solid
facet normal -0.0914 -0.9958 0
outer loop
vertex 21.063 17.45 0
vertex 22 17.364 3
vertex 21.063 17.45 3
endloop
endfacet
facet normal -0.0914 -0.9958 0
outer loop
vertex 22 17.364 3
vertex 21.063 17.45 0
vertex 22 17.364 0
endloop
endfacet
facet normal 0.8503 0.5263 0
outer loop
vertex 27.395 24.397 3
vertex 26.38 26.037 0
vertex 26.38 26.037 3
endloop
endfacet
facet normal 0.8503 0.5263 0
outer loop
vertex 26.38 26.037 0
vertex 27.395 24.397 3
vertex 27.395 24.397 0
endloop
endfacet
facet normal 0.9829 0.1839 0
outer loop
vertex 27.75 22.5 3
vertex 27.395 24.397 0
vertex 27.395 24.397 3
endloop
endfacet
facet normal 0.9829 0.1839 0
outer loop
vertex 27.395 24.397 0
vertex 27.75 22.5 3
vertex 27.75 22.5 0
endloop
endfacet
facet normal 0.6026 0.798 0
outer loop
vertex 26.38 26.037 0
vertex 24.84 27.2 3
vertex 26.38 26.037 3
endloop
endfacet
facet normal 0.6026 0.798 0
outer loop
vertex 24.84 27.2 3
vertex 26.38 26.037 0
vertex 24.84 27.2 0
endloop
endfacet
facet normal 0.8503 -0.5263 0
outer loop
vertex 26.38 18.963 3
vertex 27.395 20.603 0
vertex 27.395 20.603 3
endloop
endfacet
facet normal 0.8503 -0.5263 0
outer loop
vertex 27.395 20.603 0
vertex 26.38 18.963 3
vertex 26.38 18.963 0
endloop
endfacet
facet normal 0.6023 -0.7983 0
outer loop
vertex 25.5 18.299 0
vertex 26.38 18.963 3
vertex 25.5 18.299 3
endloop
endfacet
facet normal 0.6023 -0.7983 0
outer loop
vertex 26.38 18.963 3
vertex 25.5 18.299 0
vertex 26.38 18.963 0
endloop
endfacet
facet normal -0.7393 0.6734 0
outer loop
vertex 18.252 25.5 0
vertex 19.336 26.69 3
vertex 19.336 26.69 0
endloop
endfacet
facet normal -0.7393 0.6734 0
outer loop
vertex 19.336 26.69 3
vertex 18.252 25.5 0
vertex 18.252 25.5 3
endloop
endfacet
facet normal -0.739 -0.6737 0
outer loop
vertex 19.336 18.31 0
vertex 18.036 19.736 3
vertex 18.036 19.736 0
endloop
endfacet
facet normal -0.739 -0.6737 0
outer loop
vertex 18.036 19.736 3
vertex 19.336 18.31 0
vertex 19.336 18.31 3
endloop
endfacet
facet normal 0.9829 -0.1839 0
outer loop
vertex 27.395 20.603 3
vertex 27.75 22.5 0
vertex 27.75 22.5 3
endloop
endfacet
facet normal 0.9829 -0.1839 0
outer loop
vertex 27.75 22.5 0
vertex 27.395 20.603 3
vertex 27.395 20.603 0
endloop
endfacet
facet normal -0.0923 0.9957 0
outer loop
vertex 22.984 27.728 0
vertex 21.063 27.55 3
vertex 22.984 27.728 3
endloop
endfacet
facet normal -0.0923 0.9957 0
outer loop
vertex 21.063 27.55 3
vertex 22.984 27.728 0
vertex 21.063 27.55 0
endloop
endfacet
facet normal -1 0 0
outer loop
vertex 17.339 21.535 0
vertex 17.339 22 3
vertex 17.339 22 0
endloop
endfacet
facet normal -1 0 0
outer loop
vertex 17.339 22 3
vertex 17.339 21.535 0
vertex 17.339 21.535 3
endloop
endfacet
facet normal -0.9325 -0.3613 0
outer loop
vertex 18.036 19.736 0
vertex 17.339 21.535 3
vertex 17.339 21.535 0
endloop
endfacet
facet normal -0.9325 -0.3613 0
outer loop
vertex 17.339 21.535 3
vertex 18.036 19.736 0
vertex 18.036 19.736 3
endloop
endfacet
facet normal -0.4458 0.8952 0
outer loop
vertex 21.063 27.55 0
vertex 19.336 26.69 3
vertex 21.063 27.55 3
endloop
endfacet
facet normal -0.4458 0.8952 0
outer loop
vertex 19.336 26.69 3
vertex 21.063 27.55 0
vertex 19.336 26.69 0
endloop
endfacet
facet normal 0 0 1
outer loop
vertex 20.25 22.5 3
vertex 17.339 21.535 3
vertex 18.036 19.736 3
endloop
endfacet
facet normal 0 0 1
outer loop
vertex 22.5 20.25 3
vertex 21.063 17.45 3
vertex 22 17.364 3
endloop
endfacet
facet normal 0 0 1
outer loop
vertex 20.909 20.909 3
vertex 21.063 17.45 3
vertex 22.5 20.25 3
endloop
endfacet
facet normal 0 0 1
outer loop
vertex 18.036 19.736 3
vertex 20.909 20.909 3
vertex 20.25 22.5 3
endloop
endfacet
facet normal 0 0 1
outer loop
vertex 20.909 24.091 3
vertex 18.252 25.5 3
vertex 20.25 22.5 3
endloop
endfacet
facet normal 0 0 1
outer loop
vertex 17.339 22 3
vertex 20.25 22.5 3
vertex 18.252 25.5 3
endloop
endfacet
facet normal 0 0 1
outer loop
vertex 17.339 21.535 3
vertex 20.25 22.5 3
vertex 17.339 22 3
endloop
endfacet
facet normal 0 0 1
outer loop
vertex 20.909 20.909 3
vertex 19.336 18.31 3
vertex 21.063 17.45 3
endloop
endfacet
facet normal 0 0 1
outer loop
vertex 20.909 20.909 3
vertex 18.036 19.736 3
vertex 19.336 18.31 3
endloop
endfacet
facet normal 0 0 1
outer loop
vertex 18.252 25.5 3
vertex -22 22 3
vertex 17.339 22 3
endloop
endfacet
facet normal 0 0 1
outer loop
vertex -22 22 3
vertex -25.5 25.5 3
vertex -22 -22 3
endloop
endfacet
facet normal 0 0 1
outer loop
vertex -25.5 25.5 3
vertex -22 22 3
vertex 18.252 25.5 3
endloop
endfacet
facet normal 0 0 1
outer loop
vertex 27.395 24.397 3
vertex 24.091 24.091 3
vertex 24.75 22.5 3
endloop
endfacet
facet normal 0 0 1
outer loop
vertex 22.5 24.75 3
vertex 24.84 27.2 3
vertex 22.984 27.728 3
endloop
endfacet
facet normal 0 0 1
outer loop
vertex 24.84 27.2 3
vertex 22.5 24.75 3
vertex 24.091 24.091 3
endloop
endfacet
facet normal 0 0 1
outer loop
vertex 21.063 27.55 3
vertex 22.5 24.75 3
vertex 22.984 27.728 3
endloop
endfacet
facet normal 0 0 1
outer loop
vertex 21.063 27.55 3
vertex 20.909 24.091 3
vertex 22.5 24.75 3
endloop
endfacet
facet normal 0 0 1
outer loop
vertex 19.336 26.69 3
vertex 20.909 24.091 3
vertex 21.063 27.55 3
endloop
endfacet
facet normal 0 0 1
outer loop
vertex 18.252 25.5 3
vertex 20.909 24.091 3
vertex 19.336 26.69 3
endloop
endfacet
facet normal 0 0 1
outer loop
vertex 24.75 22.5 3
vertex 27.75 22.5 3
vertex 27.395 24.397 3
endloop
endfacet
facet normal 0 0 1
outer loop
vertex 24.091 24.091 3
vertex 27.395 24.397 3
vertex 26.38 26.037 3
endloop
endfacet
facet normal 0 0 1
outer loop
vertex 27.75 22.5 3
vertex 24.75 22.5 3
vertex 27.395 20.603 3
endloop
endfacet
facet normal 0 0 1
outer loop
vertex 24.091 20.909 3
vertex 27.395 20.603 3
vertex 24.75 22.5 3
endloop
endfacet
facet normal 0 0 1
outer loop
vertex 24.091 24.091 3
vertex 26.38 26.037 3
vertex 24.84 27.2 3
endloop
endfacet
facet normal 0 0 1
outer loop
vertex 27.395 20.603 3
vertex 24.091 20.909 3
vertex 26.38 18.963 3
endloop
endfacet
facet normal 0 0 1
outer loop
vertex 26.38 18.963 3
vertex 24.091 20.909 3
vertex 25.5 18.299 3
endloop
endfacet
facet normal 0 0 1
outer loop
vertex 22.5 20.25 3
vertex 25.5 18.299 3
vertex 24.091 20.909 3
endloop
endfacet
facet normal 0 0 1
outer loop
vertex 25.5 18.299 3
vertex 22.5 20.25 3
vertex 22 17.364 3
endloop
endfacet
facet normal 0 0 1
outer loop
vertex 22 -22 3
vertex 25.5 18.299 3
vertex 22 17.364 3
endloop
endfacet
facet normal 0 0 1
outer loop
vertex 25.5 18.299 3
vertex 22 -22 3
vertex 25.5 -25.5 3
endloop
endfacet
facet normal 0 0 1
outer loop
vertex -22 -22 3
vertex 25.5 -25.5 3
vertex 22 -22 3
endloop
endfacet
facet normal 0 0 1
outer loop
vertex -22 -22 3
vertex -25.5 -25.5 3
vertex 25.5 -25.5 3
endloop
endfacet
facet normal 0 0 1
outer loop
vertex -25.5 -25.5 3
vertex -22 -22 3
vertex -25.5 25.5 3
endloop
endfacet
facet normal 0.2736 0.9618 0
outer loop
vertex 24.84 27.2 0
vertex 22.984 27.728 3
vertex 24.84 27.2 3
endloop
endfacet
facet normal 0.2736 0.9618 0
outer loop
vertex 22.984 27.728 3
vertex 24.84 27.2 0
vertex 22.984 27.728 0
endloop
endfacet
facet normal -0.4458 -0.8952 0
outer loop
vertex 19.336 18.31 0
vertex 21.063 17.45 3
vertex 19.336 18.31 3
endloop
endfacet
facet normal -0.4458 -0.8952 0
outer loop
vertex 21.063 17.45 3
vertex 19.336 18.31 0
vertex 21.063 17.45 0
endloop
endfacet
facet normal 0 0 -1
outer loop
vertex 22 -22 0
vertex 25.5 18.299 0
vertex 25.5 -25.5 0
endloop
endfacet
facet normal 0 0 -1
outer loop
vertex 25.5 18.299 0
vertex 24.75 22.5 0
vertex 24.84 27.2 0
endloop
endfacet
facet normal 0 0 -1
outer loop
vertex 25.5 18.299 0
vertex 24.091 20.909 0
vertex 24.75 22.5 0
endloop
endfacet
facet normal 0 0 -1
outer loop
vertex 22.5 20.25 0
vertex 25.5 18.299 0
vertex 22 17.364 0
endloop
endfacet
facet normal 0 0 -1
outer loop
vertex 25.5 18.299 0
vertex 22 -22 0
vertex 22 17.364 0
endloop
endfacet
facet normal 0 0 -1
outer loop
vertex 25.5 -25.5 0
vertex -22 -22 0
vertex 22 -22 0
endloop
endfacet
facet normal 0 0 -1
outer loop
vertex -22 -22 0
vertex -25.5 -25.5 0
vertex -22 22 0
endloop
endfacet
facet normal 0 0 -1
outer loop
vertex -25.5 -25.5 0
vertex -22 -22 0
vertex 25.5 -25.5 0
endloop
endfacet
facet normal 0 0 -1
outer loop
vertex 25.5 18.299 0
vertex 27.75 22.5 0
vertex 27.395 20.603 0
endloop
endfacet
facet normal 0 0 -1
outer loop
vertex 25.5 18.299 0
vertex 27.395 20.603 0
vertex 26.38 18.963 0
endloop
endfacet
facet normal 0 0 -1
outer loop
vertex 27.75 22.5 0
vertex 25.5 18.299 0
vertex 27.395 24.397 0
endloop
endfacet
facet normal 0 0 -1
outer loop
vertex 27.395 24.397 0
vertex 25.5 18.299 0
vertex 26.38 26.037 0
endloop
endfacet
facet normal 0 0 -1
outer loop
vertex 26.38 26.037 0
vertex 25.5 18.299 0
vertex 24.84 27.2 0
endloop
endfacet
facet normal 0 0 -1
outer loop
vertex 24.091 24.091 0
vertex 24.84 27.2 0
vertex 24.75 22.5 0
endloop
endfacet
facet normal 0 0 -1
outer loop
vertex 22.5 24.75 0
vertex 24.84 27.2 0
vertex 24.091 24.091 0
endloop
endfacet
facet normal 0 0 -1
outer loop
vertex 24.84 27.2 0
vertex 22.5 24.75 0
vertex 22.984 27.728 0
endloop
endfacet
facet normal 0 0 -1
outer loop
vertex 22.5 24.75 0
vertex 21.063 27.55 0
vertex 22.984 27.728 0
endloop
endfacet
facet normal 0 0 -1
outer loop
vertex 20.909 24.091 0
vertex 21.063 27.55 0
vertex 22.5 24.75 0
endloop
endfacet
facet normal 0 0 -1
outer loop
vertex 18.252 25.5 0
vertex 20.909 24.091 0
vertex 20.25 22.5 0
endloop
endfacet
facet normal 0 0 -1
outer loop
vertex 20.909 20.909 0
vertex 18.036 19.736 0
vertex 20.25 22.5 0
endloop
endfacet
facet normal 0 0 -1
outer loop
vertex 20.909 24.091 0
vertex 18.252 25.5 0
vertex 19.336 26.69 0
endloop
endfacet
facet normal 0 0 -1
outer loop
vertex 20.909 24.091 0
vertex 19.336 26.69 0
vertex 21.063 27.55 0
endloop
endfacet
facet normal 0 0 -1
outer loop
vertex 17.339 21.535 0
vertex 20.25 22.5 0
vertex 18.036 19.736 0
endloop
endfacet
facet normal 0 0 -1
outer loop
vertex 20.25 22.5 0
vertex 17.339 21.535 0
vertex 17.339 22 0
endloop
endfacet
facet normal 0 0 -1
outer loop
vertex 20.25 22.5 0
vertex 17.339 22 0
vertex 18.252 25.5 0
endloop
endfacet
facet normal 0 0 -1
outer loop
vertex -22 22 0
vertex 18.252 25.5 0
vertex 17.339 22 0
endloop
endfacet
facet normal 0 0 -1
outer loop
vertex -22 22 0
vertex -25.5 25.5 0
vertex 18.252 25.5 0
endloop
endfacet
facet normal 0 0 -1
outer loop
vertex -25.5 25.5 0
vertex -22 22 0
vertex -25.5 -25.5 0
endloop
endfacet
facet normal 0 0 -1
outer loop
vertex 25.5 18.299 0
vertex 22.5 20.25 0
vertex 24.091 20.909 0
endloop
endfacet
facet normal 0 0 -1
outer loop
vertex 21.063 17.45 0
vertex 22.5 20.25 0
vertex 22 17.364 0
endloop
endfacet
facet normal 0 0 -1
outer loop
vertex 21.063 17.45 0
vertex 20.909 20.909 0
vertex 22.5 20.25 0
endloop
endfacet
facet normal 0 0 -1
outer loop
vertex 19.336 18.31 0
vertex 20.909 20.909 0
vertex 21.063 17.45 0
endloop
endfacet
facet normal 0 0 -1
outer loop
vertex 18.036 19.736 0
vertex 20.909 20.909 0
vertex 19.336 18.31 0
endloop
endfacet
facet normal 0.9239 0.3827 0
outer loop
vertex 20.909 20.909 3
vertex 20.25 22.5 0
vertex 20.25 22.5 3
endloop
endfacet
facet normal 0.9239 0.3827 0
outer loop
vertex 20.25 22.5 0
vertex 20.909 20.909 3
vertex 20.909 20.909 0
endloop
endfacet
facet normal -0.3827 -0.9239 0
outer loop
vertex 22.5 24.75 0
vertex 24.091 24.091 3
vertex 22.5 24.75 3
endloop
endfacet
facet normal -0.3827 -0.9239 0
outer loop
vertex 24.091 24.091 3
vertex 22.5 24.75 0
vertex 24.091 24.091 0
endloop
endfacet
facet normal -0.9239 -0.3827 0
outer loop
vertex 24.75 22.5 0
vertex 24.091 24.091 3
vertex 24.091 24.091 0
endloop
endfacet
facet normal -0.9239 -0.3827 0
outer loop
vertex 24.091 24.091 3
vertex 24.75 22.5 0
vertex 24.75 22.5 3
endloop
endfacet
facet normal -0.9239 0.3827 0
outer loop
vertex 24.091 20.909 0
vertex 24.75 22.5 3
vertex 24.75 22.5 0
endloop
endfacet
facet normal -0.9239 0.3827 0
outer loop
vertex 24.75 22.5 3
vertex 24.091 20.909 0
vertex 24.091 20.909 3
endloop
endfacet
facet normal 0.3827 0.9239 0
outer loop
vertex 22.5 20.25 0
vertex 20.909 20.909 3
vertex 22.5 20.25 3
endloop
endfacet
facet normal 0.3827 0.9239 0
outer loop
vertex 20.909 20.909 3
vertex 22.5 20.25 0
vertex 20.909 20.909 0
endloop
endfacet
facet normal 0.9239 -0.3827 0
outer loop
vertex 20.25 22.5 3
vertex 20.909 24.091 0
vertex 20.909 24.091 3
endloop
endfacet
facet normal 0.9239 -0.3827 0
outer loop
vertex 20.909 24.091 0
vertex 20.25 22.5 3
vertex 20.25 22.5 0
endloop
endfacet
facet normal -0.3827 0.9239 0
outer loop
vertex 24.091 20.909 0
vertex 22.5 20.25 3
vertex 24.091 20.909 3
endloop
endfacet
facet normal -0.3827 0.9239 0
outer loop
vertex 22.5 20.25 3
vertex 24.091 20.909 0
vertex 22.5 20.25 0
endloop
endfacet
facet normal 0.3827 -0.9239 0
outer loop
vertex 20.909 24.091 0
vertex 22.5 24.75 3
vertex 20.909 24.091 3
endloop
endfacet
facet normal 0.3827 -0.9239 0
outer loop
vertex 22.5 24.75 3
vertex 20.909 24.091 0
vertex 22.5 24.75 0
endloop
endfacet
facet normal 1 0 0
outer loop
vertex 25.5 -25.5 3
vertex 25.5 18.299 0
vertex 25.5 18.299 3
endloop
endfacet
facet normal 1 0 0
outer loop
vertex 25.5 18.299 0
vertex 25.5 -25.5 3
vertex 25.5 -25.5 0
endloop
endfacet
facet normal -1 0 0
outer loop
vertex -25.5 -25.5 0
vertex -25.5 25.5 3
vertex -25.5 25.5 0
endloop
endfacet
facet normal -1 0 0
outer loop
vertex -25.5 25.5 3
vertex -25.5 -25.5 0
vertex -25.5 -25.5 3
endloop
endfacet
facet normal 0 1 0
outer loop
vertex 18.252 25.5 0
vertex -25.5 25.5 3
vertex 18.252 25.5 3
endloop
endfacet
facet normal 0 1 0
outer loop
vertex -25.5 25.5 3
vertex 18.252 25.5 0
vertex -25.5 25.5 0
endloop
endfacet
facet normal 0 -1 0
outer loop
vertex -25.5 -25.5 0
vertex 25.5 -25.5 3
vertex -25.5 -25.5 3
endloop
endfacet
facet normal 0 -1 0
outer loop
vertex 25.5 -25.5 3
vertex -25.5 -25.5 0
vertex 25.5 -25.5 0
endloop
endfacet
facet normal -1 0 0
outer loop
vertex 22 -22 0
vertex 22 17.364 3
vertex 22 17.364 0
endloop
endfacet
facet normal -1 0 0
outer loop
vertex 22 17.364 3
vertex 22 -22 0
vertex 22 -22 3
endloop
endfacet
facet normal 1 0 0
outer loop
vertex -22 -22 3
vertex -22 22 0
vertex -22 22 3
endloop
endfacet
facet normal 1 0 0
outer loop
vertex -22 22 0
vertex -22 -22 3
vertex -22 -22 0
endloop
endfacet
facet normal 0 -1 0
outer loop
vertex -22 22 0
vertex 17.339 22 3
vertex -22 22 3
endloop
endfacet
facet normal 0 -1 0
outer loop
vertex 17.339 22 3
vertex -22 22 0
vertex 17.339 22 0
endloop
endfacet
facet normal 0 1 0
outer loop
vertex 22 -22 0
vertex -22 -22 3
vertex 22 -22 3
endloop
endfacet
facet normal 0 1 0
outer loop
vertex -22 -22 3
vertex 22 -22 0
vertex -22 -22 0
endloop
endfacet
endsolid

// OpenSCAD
//keychain-Customizable Lithopane by Mark G. Peeters 
//http://www.thingiverse.com/thing:308109
//version 1.3 
//if you are using openSCAD then you are cool! You can get DAT files for local use using this tool
//http://customizer.makerbot.com/image_surface
// i used the nice code for adjusting layers from here:
//http://www.thingiverse.com/thing:74322

// preview[view:south, tilt:top]
//
//
/* [Image] */

// Load a 100x100 pixel image.(images will be stretched to fit) Simple photos work best. Don't forget to click the Invert Colors checkbox! *** ALSO IF YOU HAVE LETTERS IN YOUR IMAGE make sure to reverse the image before uploading so the letters are not backwards.
image_file = "image-surface.dat"; // [image_surface:100x100]

/* [Adjustments] */

//shape NOTE: ALL units are in millimeters (mm)
shape = 1;//[0:circle, 1:square]
//over all size of the keychain. you picked
tag_size = 45;// [20:70]
// size for keyring 4.5 or 5 is good.
ring_hole=4.5;
// What layer height will you slice this at?  The thinner the better.
layer_height = 0.1;
//Use plastic color opacity to set this. The lower the layer height, the more layers you can use. you picked
number_of_layers = 20; // [5:30]
//Width of boarder lining the keychain (3mm is fine)
boarder_width = 3;//
//boarder thickness lining the keychain (at least 3mm for strength)
boarder_thick = 3;//

/* [Hidden] */

// base (white) will always be 2 layers thick
min_layer_height = layer_height*4;
height = layer_height*number_of_layers;
maxheight = height+min_layer_height;


// Make litho and trim bottom and sides
  difference() { //diff 1
  translate([0, 0, min_layer_height]) scale([(tag_size/100),(tag_size/100),height]) surface(file=image_file, center=true, convexity=5); //litosurface moved up min_layer_height
  translate([0,0,-(maxheight)]) linear_extrude(height=maxheight) square(tag_size, center=true);//cutting bottom off surface

if (shape==0) {//you picked circle shape------------------------------------
difference() {  //diff make tube to trim lith
                translate([0, 0, -7]) cylinder(maxheight+15,r= tag_size); //outside
                translate([0, 0, -9]) cylinder(maxheight+18,r= (tag_size/2)); //inside
               } //end diff make tube
translate([0, tag_size/2+boarder_width, -1])cylinder(maxheight+2,r= ring_hole/2); //ring hole
}//end if you picked circle------------------------------------------

if (shape==1) {//you picked square shape------------------------------------
difference() {  //diff make cube to trim litho
                translate([0, 0, -7]) cube(tag_size+15,center=true); //outside
               translate([0, 0, -9]) cube(tag_size,center=true); //inside
               } //end diff make tube
translate([tag_size/2, tag_size/2, -1])cylinder(maxheight+2,r= ring_hole/2); //ring hole
}//end if you picked square

}//end diff 1

//add boarder and loop
if (shape==0) {//you picked circle shape--------------------------
translate([0, tag_size/2+boarder_width, 0]) //move loop
difference(){//make loop
cylinder(boarder_thick,r=boarder_width+ring_hole/2); //ring support
translate([0, 0, -1])cylinder(boarder_thick+2,r= ring_hole/2); //ring hole
}

difference() {  //diff make frame tube
                 cylinder(boarder_thick,r= (tag_size/2)+boarder_width); //outside
                 cylinder(boarder_thick+1,r= (tag_size/2.02)); //inside
translate([0, tag_size/2+boarder_width, -1])cylinder(boarder_thick+2,r= ring_hole/2); //ring hole
                } //end diff make frame tube

}//end if you picked circle------------------------------------------

if (shape==1) {//you picked square shape------------------------------------
translate([tag_size/2, tag_size/2, 0]) //move loop
difference(){//make loop
cylinder(boarder_thick,r=boarder_width+ring_hole/2); //ring support
translate([0, 0, -1])cylinder(boarder_thick+2,r= ring_hole/2); //ring hole
}

difference() {  //diff make frame tube
                 translate([0,0,boarder_thick/2]) cube([tag_size+boarder_width*2,tag_size+boarder_width*2,boarder_thick],center=true); //outside
                 translate([0,0,boarder_thick/2]) cube([tag_size-1,tag_size-1,boarder_thick+1],center=true); //inside
translate([tag_size/2, tag_size/2, -1])cylinder(boarder_thick+2,r= ring_hole/2); //ring hole                
                        } //end diff make frame tube
}//end if you picked square------------------------------------------------





